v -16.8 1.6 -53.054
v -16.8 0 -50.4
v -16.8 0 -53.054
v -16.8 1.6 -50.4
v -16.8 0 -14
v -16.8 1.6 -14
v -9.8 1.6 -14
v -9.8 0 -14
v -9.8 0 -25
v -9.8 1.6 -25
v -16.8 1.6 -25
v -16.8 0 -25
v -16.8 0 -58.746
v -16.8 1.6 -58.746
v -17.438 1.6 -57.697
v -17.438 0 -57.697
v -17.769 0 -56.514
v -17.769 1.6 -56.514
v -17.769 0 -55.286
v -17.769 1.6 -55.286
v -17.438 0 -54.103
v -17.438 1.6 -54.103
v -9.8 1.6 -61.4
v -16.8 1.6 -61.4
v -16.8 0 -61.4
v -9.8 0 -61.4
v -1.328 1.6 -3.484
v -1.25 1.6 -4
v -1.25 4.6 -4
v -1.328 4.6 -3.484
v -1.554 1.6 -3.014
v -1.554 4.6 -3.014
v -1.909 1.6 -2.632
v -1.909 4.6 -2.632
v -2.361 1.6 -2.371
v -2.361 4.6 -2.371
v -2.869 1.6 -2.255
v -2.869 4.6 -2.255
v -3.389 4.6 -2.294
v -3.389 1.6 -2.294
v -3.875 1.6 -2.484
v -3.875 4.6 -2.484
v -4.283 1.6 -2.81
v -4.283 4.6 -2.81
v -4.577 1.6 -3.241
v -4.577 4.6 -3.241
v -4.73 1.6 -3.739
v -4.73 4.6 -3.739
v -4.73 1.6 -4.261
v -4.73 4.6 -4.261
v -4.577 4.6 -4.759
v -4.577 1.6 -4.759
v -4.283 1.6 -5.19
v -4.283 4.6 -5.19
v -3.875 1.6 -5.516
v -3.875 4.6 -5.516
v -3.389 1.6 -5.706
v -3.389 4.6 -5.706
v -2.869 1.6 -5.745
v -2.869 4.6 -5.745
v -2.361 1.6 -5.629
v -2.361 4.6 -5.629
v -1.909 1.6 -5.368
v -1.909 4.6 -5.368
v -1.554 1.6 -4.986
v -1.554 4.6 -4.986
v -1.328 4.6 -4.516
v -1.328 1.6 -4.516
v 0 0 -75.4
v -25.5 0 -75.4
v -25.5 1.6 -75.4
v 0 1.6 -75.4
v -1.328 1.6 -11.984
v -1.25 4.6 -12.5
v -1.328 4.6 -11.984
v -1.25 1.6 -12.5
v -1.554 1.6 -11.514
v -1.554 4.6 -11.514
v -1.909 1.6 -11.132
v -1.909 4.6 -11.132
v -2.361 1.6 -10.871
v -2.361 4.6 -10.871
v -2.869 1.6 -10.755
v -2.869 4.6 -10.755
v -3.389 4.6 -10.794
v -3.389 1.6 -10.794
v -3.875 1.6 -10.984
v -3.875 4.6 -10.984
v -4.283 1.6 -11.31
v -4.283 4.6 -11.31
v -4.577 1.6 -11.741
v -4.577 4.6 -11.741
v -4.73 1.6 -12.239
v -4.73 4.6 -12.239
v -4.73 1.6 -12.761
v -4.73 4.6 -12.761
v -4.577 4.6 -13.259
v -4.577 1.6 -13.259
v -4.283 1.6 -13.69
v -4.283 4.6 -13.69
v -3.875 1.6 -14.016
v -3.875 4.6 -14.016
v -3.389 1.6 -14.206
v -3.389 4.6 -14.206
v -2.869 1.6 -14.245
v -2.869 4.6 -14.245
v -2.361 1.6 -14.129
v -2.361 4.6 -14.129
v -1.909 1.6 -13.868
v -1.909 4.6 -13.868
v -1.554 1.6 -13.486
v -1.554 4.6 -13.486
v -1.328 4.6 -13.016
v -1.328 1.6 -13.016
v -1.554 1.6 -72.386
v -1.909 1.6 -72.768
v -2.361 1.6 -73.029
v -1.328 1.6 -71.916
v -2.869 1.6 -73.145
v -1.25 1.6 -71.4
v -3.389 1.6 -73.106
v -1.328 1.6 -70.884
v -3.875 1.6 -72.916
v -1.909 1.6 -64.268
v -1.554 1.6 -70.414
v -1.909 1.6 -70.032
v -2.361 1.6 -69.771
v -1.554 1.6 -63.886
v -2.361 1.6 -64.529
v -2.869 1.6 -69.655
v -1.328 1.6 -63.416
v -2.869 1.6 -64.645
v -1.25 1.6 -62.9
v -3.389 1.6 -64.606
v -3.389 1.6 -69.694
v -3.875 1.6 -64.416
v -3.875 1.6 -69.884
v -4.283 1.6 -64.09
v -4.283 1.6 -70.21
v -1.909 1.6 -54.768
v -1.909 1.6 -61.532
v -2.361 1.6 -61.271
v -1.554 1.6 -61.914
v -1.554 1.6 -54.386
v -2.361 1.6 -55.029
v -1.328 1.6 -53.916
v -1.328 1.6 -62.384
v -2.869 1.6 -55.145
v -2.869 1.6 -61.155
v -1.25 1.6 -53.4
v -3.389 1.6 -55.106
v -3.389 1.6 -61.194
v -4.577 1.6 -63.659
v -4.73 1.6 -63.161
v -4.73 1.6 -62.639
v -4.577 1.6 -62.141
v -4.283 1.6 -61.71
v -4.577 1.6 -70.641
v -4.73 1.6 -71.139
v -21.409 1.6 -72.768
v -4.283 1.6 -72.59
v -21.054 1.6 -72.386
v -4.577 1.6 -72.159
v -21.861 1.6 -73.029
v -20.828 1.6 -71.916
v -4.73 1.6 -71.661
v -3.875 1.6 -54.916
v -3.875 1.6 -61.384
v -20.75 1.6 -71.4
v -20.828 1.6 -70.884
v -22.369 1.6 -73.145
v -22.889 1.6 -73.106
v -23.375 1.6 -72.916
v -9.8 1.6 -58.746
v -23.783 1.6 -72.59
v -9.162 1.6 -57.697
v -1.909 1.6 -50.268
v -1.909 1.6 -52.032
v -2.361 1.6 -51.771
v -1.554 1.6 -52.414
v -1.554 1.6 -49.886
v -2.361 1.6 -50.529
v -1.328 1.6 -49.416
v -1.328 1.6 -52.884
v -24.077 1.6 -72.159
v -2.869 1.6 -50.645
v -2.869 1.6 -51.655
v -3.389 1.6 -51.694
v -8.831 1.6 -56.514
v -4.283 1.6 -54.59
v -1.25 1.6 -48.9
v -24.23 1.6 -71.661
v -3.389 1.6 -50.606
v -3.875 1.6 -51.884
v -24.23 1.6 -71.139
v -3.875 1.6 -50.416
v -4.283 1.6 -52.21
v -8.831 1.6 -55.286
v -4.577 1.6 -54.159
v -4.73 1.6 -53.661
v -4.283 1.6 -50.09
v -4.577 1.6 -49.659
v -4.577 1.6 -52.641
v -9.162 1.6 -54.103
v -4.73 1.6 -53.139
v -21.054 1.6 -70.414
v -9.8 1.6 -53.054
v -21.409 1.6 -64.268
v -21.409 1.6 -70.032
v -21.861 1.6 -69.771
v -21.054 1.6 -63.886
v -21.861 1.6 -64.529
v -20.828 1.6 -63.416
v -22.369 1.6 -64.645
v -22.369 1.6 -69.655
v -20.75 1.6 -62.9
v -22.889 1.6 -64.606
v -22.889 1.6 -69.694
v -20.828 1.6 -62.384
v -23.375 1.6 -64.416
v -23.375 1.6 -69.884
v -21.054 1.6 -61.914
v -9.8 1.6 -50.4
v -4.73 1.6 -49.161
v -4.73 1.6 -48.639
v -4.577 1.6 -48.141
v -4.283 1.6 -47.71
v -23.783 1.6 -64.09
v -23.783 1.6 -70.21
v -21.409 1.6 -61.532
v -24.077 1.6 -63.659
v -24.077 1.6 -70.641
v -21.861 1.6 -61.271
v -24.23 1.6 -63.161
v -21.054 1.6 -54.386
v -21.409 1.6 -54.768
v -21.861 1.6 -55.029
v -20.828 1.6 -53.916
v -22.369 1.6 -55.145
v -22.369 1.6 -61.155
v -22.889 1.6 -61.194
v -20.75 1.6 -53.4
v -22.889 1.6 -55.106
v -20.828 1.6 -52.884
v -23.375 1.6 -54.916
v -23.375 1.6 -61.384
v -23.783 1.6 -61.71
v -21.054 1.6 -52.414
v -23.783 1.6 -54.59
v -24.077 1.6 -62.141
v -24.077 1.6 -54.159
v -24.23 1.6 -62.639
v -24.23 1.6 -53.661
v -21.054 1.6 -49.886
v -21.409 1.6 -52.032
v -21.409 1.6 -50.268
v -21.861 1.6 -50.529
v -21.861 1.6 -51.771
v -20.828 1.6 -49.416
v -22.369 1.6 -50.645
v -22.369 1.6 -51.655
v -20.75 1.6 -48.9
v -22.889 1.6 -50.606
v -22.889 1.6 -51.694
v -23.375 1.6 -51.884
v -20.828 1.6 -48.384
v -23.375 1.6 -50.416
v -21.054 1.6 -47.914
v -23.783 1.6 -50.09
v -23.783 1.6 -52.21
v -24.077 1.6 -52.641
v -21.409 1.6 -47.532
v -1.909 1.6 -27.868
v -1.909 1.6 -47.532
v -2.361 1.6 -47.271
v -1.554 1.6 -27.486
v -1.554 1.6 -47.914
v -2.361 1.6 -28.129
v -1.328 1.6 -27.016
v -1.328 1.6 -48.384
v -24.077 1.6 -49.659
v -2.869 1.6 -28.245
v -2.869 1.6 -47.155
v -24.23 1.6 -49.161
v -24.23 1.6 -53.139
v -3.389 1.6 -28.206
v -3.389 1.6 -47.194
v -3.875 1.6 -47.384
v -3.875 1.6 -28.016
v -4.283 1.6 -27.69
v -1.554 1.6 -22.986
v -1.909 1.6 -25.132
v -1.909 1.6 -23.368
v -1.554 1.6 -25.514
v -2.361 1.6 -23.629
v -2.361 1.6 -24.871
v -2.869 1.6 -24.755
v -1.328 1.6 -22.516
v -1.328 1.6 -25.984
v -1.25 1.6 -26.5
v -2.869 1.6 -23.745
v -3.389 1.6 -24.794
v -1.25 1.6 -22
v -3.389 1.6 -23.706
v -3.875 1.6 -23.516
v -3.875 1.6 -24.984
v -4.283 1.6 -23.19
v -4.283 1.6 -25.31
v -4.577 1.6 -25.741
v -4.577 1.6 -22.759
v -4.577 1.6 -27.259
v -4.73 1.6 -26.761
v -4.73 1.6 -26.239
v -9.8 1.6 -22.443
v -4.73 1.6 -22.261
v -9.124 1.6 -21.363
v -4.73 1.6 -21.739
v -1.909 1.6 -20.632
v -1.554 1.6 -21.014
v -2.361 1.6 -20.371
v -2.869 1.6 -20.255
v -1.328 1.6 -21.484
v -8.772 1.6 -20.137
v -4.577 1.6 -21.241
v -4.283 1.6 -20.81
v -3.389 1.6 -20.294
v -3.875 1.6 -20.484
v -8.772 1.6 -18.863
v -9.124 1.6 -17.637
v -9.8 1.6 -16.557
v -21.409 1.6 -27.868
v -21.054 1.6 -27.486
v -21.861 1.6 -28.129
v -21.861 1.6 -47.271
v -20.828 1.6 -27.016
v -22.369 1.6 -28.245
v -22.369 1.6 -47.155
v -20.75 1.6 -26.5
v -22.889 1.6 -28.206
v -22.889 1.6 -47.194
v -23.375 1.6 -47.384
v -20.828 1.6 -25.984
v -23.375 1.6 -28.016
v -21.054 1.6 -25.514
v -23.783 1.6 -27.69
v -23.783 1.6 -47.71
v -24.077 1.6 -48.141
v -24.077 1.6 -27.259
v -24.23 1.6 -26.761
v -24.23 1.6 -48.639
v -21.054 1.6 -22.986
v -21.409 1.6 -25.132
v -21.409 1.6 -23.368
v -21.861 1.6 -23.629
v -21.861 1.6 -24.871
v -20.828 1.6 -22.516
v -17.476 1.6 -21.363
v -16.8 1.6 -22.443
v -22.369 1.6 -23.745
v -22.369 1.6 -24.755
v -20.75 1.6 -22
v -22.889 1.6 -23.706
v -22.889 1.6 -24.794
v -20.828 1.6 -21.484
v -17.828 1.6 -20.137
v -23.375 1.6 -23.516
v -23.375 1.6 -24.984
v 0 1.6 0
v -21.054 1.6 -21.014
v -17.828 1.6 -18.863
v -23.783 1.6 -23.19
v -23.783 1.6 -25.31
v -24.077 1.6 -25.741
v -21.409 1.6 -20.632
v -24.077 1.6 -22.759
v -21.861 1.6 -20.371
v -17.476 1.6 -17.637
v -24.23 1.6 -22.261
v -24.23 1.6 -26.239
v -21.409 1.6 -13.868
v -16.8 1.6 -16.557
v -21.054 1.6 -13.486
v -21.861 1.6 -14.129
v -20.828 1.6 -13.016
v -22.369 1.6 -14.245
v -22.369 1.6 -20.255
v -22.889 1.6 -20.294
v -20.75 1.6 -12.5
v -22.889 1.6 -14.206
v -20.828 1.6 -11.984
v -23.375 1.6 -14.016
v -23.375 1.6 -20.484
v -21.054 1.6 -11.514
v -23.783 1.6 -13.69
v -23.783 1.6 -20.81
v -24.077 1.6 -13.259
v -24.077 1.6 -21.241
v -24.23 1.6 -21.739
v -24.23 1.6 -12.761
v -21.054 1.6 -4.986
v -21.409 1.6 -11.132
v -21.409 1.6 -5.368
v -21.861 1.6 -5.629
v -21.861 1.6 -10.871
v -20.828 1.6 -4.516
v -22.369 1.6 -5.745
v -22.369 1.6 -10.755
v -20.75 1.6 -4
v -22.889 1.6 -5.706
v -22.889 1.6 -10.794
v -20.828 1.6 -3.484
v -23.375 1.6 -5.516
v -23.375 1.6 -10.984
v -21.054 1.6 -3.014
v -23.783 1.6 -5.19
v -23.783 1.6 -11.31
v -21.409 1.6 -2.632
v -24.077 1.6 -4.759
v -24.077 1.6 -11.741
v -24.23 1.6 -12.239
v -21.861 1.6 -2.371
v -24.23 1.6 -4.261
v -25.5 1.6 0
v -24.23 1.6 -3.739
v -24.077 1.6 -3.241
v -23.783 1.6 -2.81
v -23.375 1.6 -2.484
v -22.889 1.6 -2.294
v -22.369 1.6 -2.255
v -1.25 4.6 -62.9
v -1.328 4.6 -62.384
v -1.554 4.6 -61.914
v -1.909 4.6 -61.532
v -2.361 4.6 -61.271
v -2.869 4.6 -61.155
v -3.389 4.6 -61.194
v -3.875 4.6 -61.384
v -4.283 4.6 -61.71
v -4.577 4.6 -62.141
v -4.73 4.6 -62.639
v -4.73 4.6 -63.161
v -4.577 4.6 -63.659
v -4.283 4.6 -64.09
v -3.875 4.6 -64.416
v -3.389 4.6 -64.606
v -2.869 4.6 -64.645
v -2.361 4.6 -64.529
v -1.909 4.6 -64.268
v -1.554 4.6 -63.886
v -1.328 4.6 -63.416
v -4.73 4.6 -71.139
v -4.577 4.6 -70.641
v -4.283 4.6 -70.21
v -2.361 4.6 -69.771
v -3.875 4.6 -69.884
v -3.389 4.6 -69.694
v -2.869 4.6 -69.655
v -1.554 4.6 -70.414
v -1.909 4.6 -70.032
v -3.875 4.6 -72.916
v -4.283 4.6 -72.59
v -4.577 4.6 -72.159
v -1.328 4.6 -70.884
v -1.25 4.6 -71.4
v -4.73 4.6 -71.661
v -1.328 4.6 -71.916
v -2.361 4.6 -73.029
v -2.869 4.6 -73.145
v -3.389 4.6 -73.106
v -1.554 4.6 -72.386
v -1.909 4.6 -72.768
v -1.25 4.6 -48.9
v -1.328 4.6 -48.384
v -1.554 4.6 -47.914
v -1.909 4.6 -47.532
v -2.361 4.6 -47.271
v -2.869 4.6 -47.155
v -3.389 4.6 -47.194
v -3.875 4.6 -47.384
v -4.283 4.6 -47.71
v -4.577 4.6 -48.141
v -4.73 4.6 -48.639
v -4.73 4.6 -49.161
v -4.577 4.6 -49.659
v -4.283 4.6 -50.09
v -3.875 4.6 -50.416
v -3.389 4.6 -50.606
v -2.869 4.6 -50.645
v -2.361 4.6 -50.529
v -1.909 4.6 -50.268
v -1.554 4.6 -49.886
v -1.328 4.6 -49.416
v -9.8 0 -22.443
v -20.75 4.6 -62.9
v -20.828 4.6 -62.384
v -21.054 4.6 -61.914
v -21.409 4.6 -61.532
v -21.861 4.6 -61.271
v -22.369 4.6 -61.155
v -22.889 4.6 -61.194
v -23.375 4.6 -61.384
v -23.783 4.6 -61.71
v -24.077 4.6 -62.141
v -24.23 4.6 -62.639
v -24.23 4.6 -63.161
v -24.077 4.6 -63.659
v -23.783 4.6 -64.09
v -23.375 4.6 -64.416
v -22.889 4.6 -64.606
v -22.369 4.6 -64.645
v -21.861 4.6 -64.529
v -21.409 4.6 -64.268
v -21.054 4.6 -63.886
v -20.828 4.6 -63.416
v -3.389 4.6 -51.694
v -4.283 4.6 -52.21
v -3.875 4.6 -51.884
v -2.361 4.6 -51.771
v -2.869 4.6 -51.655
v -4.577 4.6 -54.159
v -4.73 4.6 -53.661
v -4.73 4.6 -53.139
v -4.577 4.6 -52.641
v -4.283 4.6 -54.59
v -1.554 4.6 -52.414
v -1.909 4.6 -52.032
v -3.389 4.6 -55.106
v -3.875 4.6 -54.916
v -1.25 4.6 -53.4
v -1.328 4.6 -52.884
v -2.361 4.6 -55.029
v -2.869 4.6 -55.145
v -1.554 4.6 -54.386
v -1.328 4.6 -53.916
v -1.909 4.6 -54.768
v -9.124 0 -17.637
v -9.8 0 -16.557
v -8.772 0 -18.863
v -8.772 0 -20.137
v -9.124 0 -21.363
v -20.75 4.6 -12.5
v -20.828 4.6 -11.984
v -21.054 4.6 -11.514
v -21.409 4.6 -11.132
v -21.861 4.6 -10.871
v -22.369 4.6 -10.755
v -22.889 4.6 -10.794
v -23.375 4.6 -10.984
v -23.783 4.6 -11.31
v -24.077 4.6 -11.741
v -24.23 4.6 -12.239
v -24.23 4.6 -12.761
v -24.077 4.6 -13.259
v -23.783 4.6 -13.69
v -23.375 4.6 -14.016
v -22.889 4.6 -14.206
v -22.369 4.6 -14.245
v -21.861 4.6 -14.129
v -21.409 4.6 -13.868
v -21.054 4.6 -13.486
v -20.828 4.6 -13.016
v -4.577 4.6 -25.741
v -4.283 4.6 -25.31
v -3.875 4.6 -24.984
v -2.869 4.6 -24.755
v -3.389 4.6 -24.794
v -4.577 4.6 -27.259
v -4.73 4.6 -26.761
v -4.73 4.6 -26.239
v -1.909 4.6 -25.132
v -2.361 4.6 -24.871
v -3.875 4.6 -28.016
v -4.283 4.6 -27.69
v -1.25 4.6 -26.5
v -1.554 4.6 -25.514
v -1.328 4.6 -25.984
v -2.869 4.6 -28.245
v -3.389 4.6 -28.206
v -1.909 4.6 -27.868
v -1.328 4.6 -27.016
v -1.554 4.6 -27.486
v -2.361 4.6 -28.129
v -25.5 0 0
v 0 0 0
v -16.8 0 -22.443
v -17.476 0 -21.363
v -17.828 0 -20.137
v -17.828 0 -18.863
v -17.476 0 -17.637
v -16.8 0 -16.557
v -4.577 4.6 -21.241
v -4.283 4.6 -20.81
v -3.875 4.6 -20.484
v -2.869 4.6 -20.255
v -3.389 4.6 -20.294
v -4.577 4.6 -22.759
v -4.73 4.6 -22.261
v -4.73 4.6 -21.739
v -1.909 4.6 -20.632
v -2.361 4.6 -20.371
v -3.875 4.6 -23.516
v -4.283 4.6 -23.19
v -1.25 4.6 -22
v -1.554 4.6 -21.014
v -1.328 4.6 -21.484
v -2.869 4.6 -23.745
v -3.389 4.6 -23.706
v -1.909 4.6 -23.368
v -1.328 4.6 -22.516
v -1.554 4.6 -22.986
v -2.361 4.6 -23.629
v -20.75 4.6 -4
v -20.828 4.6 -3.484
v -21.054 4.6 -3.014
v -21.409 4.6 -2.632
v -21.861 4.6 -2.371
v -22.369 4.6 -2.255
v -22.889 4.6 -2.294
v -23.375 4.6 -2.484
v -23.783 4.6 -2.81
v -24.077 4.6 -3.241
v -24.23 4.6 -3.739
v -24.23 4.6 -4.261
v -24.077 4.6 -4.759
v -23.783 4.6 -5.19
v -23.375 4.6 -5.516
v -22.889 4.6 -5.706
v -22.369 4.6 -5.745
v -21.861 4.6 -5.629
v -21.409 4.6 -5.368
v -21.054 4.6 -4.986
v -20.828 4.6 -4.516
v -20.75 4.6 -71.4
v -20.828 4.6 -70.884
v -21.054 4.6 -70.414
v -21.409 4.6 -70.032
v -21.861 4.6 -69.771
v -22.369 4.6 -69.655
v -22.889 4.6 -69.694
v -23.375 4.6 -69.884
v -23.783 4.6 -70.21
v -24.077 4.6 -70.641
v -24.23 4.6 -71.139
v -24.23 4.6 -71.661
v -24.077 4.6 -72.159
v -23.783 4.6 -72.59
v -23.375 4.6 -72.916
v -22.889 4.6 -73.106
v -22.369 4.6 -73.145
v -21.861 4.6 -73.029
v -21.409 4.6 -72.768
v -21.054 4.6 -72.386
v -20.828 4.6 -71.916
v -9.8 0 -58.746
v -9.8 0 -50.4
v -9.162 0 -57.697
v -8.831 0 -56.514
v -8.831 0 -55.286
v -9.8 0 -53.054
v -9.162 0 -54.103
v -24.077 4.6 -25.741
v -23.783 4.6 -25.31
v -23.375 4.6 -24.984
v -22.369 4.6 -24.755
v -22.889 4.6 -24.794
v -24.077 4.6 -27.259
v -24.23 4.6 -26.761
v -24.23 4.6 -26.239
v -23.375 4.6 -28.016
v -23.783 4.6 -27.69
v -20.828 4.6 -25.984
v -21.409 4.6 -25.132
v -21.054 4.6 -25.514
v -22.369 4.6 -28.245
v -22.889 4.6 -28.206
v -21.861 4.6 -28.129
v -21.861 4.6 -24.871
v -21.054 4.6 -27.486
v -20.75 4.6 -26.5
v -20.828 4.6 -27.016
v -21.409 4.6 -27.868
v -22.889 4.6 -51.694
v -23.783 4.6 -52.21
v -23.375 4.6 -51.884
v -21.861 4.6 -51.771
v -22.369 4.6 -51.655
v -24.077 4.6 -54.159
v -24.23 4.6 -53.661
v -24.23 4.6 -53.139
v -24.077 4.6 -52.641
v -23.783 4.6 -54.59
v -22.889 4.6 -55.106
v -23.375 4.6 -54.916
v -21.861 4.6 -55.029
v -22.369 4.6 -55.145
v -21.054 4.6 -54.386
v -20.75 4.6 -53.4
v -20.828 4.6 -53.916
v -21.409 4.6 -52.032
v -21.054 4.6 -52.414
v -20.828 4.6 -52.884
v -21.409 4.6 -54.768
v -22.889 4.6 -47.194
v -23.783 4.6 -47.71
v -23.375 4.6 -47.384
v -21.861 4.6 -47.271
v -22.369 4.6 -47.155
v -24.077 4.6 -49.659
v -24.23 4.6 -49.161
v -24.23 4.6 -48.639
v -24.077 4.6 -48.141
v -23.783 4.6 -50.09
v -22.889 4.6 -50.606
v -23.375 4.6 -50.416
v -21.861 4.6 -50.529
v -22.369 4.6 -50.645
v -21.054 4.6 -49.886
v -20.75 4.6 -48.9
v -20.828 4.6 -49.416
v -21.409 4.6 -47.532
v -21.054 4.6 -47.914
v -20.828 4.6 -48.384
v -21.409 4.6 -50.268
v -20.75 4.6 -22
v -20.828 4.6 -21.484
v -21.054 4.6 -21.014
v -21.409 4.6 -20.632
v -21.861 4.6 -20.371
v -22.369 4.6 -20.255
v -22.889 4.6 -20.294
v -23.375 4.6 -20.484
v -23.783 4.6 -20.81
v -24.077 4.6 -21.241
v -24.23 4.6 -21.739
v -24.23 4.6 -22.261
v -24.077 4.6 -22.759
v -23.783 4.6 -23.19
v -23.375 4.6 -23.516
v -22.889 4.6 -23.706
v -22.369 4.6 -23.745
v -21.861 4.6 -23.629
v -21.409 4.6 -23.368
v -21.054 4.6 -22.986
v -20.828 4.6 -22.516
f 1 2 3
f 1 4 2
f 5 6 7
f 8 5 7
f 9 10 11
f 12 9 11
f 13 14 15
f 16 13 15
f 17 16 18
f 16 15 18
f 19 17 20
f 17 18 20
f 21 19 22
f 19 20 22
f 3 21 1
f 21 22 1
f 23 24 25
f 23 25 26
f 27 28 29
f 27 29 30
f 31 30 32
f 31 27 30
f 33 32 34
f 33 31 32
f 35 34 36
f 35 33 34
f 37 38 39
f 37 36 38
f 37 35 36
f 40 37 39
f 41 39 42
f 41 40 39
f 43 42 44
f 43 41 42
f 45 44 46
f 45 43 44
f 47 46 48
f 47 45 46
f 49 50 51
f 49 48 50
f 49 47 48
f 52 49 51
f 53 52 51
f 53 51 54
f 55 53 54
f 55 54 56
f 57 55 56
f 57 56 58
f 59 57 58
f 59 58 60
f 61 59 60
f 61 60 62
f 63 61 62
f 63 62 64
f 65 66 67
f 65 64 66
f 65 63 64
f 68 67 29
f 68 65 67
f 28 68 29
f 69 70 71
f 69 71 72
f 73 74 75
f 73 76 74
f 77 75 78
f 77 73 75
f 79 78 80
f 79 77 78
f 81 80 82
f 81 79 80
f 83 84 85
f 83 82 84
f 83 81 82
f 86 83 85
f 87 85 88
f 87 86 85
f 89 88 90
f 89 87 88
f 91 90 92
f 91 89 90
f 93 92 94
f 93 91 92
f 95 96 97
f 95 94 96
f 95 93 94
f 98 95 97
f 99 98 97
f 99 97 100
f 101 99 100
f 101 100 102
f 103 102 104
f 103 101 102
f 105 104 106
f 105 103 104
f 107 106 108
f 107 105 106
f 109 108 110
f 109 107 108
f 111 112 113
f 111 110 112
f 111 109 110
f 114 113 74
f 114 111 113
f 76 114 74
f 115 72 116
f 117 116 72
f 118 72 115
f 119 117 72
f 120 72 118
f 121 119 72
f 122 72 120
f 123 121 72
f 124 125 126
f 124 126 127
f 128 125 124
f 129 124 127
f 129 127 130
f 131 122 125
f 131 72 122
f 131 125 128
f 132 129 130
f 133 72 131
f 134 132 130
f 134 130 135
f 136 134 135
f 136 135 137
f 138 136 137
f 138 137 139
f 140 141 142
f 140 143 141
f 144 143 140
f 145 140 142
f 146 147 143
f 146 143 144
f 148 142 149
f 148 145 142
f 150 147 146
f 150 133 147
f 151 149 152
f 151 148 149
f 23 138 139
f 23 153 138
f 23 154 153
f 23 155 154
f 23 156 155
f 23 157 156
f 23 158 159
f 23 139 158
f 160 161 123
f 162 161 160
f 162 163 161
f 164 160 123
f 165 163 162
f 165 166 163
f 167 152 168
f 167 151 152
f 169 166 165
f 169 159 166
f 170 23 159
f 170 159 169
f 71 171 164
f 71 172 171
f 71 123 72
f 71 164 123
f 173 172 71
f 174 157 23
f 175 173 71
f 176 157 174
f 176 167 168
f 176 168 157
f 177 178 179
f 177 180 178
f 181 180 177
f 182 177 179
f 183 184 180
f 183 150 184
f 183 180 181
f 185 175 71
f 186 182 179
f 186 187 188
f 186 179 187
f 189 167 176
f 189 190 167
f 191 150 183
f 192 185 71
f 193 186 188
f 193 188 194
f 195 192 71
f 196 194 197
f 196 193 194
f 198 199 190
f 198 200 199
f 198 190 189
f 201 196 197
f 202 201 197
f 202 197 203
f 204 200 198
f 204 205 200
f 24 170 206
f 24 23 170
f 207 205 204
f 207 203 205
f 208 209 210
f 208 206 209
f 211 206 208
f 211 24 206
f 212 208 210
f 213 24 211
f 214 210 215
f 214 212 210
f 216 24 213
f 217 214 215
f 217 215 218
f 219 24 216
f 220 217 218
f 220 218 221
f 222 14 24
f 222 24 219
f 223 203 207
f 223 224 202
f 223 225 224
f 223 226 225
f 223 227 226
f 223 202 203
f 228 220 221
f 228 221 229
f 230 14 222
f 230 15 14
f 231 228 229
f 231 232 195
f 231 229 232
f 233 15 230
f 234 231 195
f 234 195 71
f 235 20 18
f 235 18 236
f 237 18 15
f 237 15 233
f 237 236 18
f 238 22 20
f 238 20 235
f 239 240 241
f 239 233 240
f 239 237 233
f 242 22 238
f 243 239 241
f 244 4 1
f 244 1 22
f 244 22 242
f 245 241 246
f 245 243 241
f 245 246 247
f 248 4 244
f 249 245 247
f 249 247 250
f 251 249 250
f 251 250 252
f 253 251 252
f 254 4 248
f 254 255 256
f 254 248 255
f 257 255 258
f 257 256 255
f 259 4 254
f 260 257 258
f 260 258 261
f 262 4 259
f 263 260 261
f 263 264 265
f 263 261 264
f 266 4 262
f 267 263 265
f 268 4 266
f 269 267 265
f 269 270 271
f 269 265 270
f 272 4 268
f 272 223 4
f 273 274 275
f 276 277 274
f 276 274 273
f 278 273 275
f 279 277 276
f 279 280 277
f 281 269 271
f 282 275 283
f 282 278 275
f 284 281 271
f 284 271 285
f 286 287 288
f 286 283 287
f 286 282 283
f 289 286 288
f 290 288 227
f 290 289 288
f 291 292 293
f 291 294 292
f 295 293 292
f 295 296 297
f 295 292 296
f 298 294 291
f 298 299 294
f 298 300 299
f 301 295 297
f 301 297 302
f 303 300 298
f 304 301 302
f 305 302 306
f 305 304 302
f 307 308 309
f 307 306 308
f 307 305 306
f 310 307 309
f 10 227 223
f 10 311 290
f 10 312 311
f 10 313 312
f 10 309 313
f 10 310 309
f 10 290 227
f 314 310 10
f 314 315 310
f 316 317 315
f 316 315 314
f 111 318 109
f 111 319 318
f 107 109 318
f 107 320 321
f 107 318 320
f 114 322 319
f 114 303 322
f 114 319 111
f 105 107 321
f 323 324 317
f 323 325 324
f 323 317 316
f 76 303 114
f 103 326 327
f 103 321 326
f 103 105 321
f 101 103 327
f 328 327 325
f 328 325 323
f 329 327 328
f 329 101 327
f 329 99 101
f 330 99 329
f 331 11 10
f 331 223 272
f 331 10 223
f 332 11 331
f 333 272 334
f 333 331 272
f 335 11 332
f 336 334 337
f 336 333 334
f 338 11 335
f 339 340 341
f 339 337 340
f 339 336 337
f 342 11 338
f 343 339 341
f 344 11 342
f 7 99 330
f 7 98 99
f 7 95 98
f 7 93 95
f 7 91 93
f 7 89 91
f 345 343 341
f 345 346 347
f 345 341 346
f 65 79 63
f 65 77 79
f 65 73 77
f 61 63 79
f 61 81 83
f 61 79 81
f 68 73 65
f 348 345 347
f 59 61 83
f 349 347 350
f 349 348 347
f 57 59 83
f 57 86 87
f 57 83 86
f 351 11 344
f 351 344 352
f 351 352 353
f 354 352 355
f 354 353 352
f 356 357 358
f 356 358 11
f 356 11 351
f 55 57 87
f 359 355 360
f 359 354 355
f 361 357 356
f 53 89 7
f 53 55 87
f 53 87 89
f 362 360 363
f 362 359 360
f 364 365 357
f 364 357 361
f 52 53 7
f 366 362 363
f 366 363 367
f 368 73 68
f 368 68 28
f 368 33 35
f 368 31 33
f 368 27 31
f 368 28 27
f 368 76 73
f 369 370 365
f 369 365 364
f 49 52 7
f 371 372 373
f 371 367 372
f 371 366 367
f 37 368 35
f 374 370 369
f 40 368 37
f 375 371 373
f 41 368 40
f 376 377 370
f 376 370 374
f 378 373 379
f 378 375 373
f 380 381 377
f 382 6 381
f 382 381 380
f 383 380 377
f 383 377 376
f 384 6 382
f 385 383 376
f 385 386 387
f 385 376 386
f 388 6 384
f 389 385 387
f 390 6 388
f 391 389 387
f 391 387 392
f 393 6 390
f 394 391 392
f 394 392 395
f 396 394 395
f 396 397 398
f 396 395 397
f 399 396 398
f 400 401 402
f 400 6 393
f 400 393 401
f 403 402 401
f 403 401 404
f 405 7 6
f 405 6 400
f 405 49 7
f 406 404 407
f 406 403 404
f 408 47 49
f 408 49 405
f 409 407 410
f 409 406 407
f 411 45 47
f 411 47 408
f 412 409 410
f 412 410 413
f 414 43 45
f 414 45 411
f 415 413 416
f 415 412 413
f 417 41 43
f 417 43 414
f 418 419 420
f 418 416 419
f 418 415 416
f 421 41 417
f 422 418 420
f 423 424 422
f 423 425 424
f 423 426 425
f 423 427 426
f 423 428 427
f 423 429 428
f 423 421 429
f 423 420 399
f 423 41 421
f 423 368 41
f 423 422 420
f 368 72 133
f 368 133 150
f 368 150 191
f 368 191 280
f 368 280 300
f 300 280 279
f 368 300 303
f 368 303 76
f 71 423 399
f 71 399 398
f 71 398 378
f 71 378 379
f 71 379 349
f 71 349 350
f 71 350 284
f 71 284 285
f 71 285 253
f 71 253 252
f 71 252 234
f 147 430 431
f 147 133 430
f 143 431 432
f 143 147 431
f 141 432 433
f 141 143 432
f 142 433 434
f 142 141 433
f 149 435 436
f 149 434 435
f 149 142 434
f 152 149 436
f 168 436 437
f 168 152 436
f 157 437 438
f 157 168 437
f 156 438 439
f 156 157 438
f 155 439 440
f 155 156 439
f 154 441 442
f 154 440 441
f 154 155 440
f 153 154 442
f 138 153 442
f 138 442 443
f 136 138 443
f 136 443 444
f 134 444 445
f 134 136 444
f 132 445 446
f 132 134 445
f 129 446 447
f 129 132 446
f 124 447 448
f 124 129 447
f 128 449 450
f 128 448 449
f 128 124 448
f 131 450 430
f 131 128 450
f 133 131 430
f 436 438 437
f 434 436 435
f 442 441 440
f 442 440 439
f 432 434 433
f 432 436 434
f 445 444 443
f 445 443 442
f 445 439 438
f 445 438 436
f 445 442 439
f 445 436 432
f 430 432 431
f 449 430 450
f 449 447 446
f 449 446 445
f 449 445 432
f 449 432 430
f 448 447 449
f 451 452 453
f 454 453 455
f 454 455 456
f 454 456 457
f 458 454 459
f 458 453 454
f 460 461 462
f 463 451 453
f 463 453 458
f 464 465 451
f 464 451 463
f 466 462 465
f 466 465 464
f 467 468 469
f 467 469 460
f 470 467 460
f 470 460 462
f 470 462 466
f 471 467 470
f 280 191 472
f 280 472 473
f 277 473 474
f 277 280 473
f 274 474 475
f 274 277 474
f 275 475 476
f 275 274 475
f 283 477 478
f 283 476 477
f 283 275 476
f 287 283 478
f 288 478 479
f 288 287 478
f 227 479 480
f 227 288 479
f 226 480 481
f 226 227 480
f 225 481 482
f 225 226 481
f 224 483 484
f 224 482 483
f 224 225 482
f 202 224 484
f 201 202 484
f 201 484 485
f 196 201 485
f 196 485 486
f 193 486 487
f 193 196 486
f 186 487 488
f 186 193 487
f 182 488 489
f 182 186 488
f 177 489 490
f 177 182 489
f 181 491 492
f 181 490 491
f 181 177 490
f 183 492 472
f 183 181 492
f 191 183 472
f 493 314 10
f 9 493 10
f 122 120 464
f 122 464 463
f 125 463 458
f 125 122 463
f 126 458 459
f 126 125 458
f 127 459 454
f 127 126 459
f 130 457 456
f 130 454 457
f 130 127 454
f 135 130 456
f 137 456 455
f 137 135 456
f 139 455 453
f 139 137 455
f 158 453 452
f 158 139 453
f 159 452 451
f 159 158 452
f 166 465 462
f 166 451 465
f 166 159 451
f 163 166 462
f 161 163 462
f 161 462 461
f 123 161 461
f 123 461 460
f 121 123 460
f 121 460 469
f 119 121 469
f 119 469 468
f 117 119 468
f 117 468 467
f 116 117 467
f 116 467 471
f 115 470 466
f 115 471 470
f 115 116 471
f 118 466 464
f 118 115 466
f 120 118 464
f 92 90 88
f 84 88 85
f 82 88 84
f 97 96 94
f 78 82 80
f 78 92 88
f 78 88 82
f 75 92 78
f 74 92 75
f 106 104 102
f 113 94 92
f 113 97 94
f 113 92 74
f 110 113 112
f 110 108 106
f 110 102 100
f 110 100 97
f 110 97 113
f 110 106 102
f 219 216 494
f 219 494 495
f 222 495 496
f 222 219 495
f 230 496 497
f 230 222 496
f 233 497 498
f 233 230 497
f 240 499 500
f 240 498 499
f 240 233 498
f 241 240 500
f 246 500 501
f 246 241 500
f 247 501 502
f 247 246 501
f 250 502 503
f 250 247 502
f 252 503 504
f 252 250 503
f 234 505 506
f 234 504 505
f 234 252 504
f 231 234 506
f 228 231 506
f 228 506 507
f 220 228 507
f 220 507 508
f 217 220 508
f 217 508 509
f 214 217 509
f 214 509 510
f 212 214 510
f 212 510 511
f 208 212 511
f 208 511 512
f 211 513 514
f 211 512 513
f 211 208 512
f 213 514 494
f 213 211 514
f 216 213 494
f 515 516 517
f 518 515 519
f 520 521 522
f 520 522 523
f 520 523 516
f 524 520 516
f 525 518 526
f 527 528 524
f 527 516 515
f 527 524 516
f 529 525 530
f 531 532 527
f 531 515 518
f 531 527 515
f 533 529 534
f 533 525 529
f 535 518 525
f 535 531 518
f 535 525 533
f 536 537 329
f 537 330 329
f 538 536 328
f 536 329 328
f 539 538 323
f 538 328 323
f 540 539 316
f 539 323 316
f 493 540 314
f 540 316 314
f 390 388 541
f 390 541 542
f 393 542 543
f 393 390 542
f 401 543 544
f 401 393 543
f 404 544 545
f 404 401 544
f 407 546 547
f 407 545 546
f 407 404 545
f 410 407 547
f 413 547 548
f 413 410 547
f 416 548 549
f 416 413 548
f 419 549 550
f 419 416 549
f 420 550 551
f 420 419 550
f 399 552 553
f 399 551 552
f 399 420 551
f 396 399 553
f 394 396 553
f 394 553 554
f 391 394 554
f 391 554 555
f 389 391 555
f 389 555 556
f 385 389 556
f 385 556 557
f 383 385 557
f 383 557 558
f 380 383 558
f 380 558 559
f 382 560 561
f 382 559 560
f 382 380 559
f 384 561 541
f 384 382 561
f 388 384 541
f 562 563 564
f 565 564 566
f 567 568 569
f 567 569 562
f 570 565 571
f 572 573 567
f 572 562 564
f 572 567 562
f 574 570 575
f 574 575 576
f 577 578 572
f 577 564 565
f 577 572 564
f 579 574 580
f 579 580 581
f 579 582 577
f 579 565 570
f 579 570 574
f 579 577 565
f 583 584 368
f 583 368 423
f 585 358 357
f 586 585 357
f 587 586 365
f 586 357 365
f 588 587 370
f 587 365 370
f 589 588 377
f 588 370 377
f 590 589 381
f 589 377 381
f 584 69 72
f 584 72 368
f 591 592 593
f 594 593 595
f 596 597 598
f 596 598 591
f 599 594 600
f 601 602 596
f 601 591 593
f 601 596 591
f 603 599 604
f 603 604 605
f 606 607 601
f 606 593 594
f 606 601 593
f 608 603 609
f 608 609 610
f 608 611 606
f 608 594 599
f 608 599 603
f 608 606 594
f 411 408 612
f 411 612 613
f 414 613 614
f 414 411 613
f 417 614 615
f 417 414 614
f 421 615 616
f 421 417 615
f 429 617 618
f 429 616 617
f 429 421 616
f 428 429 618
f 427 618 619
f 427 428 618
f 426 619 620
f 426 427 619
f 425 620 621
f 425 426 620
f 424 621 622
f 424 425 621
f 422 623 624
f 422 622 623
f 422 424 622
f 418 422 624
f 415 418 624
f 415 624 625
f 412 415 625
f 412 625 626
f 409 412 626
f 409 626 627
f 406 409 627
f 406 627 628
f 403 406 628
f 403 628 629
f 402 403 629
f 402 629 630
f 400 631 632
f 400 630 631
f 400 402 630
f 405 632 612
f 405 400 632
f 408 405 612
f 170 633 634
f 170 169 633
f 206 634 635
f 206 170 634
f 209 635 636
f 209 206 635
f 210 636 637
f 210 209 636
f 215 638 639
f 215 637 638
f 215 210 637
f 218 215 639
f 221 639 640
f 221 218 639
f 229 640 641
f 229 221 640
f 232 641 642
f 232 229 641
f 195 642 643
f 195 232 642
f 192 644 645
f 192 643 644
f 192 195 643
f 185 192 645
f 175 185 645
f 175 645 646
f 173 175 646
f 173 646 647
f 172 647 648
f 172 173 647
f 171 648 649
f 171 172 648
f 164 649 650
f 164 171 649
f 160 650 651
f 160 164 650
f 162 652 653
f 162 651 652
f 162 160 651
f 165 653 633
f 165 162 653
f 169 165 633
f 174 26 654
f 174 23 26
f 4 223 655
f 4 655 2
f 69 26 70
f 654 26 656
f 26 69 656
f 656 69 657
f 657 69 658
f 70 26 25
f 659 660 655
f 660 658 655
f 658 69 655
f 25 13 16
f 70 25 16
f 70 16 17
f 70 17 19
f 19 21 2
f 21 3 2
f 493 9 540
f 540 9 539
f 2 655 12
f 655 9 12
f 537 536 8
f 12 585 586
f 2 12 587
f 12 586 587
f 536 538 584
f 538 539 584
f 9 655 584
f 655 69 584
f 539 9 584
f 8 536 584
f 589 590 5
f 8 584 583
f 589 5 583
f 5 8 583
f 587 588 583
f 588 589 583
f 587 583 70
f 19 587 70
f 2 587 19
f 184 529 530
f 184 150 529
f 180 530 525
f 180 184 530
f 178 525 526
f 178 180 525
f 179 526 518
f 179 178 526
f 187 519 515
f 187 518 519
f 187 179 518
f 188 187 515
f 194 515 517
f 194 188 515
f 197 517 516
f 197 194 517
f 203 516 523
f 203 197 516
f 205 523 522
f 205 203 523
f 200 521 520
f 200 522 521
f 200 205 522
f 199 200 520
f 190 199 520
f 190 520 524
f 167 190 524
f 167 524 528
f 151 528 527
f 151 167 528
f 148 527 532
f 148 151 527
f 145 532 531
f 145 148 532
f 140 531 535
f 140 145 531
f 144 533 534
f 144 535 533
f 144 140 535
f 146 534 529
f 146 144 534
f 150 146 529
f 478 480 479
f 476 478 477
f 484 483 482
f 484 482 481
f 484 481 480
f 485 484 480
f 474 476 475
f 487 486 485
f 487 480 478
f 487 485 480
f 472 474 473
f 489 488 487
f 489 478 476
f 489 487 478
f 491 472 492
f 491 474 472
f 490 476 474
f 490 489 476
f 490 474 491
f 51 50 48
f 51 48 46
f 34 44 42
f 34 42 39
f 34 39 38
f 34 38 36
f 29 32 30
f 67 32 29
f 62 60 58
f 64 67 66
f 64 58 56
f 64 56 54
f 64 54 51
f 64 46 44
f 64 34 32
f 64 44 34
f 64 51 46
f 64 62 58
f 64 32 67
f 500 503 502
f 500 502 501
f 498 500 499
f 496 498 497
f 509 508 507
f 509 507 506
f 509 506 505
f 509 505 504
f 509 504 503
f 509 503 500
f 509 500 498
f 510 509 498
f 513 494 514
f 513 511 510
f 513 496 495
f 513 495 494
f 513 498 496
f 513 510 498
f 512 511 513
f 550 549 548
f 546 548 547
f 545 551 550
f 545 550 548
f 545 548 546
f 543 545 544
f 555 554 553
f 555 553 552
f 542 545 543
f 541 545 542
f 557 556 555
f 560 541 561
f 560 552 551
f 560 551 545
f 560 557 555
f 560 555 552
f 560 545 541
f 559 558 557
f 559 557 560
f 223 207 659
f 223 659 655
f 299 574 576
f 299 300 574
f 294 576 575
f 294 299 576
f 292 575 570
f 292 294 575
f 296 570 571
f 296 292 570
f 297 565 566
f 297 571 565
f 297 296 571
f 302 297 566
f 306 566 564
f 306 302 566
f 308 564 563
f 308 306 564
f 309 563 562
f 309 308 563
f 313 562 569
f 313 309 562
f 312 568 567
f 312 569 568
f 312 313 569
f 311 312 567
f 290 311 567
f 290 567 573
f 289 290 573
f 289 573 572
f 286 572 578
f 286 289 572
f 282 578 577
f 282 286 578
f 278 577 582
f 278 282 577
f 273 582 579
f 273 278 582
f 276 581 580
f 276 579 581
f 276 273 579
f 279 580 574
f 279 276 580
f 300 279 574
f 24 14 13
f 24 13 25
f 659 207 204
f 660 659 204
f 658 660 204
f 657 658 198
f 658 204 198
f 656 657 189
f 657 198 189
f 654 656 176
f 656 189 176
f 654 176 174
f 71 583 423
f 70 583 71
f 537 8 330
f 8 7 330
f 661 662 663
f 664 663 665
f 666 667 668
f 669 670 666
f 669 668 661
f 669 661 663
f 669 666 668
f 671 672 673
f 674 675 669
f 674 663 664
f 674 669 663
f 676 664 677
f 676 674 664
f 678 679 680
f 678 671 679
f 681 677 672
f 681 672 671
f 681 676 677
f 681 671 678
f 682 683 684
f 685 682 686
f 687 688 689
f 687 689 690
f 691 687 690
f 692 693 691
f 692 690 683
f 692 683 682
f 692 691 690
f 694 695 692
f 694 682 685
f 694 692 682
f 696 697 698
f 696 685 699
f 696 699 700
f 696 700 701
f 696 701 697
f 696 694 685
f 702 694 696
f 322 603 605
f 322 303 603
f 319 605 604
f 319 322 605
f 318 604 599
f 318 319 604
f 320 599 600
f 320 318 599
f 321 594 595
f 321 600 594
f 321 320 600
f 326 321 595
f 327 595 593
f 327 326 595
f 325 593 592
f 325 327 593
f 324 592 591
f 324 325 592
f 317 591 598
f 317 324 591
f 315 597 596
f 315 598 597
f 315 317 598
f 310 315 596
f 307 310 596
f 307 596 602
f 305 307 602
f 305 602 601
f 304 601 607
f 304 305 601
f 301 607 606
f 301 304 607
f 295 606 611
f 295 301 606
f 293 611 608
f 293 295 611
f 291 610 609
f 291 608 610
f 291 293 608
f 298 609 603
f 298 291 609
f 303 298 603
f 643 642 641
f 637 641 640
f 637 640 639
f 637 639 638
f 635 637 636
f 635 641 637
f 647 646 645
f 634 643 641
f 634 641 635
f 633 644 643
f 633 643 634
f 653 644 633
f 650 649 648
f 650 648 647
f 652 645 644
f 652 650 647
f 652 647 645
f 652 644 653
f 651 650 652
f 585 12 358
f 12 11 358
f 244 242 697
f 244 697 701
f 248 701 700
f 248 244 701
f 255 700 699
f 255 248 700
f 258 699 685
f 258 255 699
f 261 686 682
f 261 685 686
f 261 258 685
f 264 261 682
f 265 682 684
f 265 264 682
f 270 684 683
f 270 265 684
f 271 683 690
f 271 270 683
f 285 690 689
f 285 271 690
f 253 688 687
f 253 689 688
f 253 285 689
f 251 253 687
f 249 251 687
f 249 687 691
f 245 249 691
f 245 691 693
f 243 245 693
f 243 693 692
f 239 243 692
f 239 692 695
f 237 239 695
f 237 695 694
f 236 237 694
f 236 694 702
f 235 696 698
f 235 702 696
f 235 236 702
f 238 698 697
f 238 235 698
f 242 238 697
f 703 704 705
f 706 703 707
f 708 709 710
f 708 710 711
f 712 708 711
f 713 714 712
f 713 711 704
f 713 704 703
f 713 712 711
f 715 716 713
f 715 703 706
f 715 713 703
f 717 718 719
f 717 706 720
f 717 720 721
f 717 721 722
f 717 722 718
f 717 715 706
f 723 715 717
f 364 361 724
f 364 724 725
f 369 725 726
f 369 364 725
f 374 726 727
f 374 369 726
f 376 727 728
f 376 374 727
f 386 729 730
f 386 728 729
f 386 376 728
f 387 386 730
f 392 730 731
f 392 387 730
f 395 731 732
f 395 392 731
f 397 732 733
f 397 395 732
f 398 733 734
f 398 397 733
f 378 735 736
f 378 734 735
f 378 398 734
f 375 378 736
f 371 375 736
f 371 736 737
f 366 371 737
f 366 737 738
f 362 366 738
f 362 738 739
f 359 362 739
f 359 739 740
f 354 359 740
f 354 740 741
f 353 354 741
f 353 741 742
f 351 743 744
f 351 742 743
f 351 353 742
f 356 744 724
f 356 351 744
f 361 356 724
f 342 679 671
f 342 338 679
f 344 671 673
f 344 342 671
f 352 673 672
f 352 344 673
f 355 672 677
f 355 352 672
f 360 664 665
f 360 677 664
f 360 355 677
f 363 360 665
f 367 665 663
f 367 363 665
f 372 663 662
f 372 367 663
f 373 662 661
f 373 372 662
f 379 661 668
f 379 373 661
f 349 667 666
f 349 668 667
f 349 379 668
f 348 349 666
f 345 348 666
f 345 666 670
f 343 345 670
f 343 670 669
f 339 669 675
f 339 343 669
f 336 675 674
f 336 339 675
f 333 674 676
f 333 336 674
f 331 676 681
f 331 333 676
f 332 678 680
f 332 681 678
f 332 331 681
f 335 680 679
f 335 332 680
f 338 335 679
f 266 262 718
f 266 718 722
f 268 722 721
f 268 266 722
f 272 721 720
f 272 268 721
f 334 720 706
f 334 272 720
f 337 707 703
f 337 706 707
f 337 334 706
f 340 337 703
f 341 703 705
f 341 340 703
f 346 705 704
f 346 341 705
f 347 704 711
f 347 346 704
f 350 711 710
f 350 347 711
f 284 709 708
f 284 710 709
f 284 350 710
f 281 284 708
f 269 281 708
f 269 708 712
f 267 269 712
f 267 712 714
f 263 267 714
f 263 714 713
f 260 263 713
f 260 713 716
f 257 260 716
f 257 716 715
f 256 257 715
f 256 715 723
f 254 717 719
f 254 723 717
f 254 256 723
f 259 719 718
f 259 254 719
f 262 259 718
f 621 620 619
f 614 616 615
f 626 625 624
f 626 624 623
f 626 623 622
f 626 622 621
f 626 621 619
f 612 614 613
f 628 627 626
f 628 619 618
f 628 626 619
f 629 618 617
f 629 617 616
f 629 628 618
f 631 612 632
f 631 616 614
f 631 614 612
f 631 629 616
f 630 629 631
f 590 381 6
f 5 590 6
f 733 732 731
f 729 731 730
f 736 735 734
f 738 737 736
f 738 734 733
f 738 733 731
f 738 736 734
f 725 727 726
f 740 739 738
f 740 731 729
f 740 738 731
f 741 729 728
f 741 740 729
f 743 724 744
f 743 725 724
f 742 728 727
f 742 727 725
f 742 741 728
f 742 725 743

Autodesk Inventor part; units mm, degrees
ref_plane "YZ Plane" through (0, 0, 0) normal (1, 0, 0) x (0, 1, 0)
ref_plane "XZ Plane" through (0, 0, 0) normal (0, 1, 0) x (-1, 0, 0)
ref_plane "XY Plane" through (0, 0, 0) normal (0, 0, 1) x (1, 0, 0)
sketch "Sketch1" plane through (0, 0, 0) normal (0, 1, 0) x (-1, 0, 0)
  line L0 (0, 0) -> (25.5, 0)
  line L1 (25.5, 0) -> (25.5, -75.4)
  line L2 (25.5, -75.4) -> (0, -75.4)
  line L3 (0, -75.4) -> (0, 0)
  dimension "d0" = 25.5
  dimension "d1" = 75.4
extrude "Extrusion1" add sketch "Sketch1" along normal blind 1.6
sketch "Sketch2" plane through (0, 1.6, 0) normal (0, 1, 0) x (1, 0, 0)
  line L0 (-25.5, 0) -> (0, 0) projected
  line L1 (0, 0) -> (0, 75.4) projected
  line L2 (0, 75.4) -> (-25.5, 75.4) projected
  line L3 (-25.5, 75.4) -> (-25.5, 0) projected
  circle A0 centre (-22.5, 71.4) radius 1.75
  circle A1 centre (-22.5, 62.9) radius 1.75
  circle A2 centre (-22.5, 53.4) radius 1.75
  circle A3 centre (-22.5, 48.9) radius 1.75
  line L4 (-25.5, 0) -> (0, 0) construction
  line L5 (-12.75, 0) -> (-12.75, 75.4) construction
  line L6 (0, 75.4) -> (-25.5, 75.4) construction
  line L7 (-25.5, 75.4) -> (-25.5, 0) construction
  line L8 (-25.5, 37.7) -> (0, 37.7) construction
  circle A4 centre (-3, 71.4) radius 1.75
  circle A5 centre (-3, 62.9) radius 1.75
  circle A6 centre (-3, 53.4) radius 1.75
  circle A7 centre (-3, 48.9) radius 1.75
  circle A8 centre (-22.5, 4) radius 1.75
  circle A9 centre (-22.5, 12.5) radius 1.75
  circle A10 centre (-22.5, 22) radius 1.75
  circle A11 centre (-22.5, 26.5) radius 1.75
  circle A12 centre (-3, 22) radius 1.75
  circle A13 centre (-3, 12.5) radius 1.75
  circle A14 centre (-3, 4) radius 1.75
  circle A15 centre (-3, 26.5) radius 1.75
  dimension "d4" = 3.5
  dimension "d5" = 3
  dimension "d6" = 4
  dimension "d7" = 3.5
  dimension "d8" = 12.5
  dimension "d9" = 3.5
  dimension "d10" = 22
  dimension "d11" = 3.5
  dimension "d12" = 26.5
extrude "Extrusion2" add sketch "Sketch2" along normal blind 3 contours A0 | A1 | A2 | A3 | A4 | A5 | A6 | A7 | A8 | A9 | A10 | A11 | A12 | A13 | A14 | A15
sketch "Sketch3" plane through (0, 1.6, 0) normal (0, 1, 0) x (1, 0, 0)
  circle A0 centre (-22.5, 4) radius 1.75 projected
  circle A1 centre (-22.5, 12.5) radius 1.75 projected
  circle A2 centre (-22.5, 22) radius 1.75 projected
  circle A3 centre (-22.5, 26.5) radius 1.75 projected
  circle A4 centre (-3, 71.4) radius 1.75 projected
  circle A5 centre (-3, 53.4) radius 1.75 projected
  circle A6 centre (-22.5, 53.4) radius 1.75 projected
  circle A7 centre (-22.5, 71.4) radius 1.75 projected
  circle A8 centre (-22.5, 62.9) radius 1.75 projected
  circle A9 centre (-22.5, 48.9) radius 1.75 projected
  circle A10 centre (-3, 62.9) radius 1.75 projected
  circle A11 centre (-3, 48.9) radius 1.75 projected
  circle A12 centre (-3, 26.5) radius 1.75 projected
  circle A13 centre (-3, 22) radius 1.75 projected
  circle A14 centre (-3, 12.5) radius 1.75 projected
  circle A15 centre (-3, 4) radius 1.75 projected
  line L0 (-25.5, 0) -> (0, 0) projected
  line L1 (0, 0) -> (0, 75.4) projected
  line L2 (0, 75.4) -> (-25.5, 75.4) projected
  line L3 (-25.5, 75.4) -> (-25.5, 0) projected
  line L4 (-16.8, 61.4) -> (-9.8, 61.4)
  line L5 (-9.8, 61.4) -> (-9.8, 50.4)
  line L6 (-9.8, 50.4) -> (-16.8, 50.4)
  line L7 (-16.8, 50.4) -> (-16.8, 61.4)
  line L8 (-25.5, 0) -> (-25.5, 75.4) projected
  line L9 (-25.5, 37.7) -> (0, 37.7)
  line L10 (0, 75.4) -> (0, 0) projected
  line L11 (-16.8, 14) -> (-9.8, 14)
  line L12 (-9.8, 14) -> (-9.8, 25)
  line L13 (-9.8, 25) -> (-16.8, 25)
  line L14 (-16.8, 25) -> (-16.8, 14)
  circle A16 centre (-13.3, 55.9) radius 4.511
  circle A17 centre (-13.3, 19.5) radius 4.5729
  dimension "d15" = 7
  dimension "d16" = 11
  dimension "d17" = 14
  dimension "d18" = 8.7
extrude "Extrusion3" cut sketch "Sketch3" against normal blind 3 contours L4 L5 A16 L7 | A16 L5 L7 | L7 A16 | A16 L5 | A16 L5 L6 L7 | L14 A17 L12 L11 | A17 L14 | L14 A17 L12 | L12 A17 | L14 L13 L12 A17
properties part number "00_FluidicChip_AlexSwen"
